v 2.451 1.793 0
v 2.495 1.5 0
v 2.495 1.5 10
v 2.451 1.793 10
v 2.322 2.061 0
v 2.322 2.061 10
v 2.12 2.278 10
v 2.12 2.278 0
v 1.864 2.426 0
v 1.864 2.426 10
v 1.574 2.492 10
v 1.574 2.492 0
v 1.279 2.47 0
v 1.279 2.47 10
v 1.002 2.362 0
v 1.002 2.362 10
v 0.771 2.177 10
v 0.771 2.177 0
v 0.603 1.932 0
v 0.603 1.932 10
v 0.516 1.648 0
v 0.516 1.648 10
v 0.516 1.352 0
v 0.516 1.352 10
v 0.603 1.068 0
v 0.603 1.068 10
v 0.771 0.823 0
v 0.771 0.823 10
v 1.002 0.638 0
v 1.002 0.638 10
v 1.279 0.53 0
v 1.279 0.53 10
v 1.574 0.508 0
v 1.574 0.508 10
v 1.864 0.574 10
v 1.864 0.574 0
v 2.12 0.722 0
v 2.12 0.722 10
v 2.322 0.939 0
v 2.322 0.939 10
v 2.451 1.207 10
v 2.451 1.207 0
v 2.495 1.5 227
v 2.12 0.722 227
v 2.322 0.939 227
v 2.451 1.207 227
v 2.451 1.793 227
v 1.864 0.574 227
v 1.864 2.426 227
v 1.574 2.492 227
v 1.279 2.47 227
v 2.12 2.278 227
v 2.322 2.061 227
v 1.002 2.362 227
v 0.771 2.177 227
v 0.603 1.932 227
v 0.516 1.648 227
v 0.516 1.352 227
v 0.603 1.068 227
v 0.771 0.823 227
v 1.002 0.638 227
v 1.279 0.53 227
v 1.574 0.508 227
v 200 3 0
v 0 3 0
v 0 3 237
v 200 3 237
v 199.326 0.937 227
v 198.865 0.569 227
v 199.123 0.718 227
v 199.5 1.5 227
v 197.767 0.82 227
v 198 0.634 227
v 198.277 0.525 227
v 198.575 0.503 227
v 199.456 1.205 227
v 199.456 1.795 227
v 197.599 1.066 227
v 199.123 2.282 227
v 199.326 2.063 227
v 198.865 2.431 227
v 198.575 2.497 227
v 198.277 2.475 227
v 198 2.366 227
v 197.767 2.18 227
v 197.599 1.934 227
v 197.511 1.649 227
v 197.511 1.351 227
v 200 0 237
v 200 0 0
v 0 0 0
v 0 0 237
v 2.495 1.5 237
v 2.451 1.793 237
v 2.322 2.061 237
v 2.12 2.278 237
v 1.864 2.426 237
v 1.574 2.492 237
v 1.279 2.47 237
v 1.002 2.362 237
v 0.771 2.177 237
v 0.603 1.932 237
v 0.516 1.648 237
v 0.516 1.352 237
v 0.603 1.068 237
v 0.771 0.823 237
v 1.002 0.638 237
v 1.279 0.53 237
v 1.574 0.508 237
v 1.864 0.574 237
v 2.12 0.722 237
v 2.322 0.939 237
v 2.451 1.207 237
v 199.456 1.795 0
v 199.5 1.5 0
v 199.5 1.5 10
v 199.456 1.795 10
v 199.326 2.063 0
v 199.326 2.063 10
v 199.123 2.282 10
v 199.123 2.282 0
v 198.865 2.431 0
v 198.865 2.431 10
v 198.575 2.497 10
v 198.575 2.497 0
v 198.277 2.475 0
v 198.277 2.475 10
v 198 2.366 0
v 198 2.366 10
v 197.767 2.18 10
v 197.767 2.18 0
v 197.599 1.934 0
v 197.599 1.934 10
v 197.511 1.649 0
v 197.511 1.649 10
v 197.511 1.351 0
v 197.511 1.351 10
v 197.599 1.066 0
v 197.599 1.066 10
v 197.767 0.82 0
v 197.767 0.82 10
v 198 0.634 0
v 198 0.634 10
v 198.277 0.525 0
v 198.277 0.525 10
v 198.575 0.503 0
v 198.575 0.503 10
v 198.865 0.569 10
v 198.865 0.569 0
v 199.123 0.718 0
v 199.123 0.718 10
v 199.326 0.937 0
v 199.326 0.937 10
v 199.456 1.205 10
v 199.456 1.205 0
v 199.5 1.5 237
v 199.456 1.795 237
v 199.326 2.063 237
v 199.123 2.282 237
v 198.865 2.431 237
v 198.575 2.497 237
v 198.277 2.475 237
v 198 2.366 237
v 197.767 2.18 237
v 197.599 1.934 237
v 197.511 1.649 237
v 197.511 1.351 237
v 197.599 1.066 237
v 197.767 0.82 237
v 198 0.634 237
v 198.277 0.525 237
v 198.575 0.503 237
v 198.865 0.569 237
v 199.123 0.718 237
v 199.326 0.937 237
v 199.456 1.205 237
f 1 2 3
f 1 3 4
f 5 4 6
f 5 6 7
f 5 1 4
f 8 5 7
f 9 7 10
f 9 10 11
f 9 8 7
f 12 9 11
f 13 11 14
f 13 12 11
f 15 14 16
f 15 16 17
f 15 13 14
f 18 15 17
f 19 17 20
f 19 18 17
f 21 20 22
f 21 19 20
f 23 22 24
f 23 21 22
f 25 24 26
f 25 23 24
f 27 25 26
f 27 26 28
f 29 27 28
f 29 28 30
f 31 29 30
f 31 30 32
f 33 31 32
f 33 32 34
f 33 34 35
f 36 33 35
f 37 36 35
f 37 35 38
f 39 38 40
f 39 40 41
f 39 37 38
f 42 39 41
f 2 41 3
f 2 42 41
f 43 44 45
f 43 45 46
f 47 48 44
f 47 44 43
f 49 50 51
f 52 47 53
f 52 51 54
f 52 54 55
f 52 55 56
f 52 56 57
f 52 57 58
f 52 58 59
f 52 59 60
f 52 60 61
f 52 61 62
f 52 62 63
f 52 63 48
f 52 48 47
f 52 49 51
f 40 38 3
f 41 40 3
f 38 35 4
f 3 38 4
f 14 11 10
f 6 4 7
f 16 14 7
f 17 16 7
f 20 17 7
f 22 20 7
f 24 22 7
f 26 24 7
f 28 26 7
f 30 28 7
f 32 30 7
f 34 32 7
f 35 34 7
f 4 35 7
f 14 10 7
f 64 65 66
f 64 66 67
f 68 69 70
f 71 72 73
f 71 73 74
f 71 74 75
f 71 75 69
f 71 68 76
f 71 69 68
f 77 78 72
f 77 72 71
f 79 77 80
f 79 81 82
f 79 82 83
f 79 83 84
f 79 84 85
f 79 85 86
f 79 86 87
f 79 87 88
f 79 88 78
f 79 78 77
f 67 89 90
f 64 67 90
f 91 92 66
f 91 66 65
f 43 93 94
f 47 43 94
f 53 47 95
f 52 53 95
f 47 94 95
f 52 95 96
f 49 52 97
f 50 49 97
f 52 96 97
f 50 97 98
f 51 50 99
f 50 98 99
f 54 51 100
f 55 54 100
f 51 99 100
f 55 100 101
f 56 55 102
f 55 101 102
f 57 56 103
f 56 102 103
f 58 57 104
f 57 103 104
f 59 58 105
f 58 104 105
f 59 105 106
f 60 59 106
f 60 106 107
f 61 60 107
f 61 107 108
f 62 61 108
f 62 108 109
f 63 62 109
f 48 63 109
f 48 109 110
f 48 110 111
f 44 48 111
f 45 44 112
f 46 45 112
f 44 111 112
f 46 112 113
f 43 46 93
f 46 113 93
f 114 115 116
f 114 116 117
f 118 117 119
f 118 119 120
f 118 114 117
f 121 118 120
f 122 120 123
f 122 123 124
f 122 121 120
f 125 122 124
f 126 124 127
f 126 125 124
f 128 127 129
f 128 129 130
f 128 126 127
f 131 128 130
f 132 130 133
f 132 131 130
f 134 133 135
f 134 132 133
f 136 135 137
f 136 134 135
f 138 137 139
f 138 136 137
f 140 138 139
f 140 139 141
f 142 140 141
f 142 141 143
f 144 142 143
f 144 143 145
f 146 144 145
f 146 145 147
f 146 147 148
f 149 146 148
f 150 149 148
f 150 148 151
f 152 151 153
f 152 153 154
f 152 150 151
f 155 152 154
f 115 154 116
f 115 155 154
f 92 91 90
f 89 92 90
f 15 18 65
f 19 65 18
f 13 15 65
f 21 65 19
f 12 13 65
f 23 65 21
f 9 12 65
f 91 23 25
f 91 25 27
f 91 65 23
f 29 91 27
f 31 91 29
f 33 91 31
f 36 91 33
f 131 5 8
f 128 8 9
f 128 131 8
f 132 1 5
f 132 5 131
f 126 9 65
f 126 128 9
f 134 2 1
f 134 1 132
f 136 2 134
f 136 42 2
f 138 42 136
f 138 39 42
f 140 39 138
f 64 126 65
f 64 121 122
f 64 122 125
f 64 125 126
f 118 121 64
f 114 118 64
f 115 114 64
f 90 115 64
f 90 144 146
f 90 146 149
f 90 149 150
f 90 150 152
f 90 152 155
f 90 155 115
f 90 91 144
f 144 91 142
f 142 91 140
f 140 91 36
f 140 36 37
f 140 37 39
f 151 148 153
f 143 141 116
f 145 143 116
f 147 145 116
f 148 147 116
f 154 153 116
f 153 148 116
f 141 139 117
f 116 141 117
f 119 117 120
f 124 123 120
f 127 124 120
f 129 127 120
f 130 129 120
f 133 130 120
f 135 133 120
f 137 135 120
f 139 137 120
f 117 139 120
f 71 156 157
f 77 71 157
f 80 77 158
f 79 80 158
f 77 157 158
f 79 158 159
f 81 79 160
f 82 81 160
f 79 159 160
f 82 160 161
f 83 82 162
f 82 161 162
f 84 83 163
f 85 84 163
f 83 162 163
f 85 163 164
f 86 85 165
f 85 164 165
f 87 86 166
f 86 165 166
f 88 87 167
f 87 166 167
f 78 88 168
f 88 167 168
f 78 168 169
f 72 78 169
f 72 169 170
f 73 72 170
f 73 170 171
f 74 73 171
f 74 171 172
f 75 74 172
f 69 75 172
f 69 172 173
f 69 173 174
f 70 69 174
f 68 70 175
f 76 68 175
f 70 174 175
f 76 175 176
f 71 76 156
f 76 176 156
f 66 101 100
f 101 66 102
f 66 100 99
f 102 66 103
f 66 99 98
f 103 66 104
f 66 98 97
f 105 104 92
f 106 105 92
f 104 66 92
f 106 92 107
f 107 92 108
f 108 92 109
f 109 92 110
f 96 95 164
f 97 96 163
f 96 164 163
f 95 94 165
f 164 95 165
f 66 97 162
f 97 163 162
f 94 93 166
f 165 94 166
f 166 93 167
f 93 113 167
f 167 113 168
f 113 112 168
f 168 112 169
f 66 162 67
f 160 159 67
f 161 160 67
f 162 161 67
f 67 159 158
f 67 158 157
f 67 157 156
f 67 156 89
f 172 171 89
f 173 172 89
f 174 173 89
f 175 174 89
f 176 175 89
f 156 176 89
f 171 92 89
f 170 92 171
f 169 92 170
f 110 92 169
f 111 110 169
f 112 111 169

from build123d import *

# Parameters (mm, degrees)
SKETCH1_W           = 200
SKETCH1_H           = 237
BOSS_EXTRUDE1_DEPTH = 3
SKETCH4_R           = 0.995052607
SKETCH4_R_2         = 1
CUT_EXTRUDE1_DEPTH  = 10


with BuildPart() as part:
    # Sketch1 → Boss-Extrude1 (new body)
    with BuildSketch(Plane(origin=(0, 0, 0), x_dir=(1, 0, 0), z_dir=(0, 1, 0))):
        with Locations((100, -118.5)):
            Rectangle(SKETCH1_W, SKETCH1_H)
    extrude(amount=BOSS_EXTRUDE1_DEPTH)

    # Sketch4 → Cut-Extrude1 (cut)
    with BuildSketch(Plane.XY.offset(237)):
        with Locations((1.5, 1.5)):
            Circle(SKETCH4_R)
        with Locations((198.5, 1.5)):
            Circle(SKETCH4_R_2)
    cut_extrude1 = extrude(amount=-CUT_EXTRUDE1_DEPTH, mode=Mode.SUBTRACT)

    # Mirror1: Cut-Extrude1 across plane
    add(cut_extrude1.mirror(Plane(origin=(0, 0, 118.5), x_dir=(1, 0, 0), z_dir=(0, 0, -1))), mode=Mode.SUBTRACT)


solid = part.part
